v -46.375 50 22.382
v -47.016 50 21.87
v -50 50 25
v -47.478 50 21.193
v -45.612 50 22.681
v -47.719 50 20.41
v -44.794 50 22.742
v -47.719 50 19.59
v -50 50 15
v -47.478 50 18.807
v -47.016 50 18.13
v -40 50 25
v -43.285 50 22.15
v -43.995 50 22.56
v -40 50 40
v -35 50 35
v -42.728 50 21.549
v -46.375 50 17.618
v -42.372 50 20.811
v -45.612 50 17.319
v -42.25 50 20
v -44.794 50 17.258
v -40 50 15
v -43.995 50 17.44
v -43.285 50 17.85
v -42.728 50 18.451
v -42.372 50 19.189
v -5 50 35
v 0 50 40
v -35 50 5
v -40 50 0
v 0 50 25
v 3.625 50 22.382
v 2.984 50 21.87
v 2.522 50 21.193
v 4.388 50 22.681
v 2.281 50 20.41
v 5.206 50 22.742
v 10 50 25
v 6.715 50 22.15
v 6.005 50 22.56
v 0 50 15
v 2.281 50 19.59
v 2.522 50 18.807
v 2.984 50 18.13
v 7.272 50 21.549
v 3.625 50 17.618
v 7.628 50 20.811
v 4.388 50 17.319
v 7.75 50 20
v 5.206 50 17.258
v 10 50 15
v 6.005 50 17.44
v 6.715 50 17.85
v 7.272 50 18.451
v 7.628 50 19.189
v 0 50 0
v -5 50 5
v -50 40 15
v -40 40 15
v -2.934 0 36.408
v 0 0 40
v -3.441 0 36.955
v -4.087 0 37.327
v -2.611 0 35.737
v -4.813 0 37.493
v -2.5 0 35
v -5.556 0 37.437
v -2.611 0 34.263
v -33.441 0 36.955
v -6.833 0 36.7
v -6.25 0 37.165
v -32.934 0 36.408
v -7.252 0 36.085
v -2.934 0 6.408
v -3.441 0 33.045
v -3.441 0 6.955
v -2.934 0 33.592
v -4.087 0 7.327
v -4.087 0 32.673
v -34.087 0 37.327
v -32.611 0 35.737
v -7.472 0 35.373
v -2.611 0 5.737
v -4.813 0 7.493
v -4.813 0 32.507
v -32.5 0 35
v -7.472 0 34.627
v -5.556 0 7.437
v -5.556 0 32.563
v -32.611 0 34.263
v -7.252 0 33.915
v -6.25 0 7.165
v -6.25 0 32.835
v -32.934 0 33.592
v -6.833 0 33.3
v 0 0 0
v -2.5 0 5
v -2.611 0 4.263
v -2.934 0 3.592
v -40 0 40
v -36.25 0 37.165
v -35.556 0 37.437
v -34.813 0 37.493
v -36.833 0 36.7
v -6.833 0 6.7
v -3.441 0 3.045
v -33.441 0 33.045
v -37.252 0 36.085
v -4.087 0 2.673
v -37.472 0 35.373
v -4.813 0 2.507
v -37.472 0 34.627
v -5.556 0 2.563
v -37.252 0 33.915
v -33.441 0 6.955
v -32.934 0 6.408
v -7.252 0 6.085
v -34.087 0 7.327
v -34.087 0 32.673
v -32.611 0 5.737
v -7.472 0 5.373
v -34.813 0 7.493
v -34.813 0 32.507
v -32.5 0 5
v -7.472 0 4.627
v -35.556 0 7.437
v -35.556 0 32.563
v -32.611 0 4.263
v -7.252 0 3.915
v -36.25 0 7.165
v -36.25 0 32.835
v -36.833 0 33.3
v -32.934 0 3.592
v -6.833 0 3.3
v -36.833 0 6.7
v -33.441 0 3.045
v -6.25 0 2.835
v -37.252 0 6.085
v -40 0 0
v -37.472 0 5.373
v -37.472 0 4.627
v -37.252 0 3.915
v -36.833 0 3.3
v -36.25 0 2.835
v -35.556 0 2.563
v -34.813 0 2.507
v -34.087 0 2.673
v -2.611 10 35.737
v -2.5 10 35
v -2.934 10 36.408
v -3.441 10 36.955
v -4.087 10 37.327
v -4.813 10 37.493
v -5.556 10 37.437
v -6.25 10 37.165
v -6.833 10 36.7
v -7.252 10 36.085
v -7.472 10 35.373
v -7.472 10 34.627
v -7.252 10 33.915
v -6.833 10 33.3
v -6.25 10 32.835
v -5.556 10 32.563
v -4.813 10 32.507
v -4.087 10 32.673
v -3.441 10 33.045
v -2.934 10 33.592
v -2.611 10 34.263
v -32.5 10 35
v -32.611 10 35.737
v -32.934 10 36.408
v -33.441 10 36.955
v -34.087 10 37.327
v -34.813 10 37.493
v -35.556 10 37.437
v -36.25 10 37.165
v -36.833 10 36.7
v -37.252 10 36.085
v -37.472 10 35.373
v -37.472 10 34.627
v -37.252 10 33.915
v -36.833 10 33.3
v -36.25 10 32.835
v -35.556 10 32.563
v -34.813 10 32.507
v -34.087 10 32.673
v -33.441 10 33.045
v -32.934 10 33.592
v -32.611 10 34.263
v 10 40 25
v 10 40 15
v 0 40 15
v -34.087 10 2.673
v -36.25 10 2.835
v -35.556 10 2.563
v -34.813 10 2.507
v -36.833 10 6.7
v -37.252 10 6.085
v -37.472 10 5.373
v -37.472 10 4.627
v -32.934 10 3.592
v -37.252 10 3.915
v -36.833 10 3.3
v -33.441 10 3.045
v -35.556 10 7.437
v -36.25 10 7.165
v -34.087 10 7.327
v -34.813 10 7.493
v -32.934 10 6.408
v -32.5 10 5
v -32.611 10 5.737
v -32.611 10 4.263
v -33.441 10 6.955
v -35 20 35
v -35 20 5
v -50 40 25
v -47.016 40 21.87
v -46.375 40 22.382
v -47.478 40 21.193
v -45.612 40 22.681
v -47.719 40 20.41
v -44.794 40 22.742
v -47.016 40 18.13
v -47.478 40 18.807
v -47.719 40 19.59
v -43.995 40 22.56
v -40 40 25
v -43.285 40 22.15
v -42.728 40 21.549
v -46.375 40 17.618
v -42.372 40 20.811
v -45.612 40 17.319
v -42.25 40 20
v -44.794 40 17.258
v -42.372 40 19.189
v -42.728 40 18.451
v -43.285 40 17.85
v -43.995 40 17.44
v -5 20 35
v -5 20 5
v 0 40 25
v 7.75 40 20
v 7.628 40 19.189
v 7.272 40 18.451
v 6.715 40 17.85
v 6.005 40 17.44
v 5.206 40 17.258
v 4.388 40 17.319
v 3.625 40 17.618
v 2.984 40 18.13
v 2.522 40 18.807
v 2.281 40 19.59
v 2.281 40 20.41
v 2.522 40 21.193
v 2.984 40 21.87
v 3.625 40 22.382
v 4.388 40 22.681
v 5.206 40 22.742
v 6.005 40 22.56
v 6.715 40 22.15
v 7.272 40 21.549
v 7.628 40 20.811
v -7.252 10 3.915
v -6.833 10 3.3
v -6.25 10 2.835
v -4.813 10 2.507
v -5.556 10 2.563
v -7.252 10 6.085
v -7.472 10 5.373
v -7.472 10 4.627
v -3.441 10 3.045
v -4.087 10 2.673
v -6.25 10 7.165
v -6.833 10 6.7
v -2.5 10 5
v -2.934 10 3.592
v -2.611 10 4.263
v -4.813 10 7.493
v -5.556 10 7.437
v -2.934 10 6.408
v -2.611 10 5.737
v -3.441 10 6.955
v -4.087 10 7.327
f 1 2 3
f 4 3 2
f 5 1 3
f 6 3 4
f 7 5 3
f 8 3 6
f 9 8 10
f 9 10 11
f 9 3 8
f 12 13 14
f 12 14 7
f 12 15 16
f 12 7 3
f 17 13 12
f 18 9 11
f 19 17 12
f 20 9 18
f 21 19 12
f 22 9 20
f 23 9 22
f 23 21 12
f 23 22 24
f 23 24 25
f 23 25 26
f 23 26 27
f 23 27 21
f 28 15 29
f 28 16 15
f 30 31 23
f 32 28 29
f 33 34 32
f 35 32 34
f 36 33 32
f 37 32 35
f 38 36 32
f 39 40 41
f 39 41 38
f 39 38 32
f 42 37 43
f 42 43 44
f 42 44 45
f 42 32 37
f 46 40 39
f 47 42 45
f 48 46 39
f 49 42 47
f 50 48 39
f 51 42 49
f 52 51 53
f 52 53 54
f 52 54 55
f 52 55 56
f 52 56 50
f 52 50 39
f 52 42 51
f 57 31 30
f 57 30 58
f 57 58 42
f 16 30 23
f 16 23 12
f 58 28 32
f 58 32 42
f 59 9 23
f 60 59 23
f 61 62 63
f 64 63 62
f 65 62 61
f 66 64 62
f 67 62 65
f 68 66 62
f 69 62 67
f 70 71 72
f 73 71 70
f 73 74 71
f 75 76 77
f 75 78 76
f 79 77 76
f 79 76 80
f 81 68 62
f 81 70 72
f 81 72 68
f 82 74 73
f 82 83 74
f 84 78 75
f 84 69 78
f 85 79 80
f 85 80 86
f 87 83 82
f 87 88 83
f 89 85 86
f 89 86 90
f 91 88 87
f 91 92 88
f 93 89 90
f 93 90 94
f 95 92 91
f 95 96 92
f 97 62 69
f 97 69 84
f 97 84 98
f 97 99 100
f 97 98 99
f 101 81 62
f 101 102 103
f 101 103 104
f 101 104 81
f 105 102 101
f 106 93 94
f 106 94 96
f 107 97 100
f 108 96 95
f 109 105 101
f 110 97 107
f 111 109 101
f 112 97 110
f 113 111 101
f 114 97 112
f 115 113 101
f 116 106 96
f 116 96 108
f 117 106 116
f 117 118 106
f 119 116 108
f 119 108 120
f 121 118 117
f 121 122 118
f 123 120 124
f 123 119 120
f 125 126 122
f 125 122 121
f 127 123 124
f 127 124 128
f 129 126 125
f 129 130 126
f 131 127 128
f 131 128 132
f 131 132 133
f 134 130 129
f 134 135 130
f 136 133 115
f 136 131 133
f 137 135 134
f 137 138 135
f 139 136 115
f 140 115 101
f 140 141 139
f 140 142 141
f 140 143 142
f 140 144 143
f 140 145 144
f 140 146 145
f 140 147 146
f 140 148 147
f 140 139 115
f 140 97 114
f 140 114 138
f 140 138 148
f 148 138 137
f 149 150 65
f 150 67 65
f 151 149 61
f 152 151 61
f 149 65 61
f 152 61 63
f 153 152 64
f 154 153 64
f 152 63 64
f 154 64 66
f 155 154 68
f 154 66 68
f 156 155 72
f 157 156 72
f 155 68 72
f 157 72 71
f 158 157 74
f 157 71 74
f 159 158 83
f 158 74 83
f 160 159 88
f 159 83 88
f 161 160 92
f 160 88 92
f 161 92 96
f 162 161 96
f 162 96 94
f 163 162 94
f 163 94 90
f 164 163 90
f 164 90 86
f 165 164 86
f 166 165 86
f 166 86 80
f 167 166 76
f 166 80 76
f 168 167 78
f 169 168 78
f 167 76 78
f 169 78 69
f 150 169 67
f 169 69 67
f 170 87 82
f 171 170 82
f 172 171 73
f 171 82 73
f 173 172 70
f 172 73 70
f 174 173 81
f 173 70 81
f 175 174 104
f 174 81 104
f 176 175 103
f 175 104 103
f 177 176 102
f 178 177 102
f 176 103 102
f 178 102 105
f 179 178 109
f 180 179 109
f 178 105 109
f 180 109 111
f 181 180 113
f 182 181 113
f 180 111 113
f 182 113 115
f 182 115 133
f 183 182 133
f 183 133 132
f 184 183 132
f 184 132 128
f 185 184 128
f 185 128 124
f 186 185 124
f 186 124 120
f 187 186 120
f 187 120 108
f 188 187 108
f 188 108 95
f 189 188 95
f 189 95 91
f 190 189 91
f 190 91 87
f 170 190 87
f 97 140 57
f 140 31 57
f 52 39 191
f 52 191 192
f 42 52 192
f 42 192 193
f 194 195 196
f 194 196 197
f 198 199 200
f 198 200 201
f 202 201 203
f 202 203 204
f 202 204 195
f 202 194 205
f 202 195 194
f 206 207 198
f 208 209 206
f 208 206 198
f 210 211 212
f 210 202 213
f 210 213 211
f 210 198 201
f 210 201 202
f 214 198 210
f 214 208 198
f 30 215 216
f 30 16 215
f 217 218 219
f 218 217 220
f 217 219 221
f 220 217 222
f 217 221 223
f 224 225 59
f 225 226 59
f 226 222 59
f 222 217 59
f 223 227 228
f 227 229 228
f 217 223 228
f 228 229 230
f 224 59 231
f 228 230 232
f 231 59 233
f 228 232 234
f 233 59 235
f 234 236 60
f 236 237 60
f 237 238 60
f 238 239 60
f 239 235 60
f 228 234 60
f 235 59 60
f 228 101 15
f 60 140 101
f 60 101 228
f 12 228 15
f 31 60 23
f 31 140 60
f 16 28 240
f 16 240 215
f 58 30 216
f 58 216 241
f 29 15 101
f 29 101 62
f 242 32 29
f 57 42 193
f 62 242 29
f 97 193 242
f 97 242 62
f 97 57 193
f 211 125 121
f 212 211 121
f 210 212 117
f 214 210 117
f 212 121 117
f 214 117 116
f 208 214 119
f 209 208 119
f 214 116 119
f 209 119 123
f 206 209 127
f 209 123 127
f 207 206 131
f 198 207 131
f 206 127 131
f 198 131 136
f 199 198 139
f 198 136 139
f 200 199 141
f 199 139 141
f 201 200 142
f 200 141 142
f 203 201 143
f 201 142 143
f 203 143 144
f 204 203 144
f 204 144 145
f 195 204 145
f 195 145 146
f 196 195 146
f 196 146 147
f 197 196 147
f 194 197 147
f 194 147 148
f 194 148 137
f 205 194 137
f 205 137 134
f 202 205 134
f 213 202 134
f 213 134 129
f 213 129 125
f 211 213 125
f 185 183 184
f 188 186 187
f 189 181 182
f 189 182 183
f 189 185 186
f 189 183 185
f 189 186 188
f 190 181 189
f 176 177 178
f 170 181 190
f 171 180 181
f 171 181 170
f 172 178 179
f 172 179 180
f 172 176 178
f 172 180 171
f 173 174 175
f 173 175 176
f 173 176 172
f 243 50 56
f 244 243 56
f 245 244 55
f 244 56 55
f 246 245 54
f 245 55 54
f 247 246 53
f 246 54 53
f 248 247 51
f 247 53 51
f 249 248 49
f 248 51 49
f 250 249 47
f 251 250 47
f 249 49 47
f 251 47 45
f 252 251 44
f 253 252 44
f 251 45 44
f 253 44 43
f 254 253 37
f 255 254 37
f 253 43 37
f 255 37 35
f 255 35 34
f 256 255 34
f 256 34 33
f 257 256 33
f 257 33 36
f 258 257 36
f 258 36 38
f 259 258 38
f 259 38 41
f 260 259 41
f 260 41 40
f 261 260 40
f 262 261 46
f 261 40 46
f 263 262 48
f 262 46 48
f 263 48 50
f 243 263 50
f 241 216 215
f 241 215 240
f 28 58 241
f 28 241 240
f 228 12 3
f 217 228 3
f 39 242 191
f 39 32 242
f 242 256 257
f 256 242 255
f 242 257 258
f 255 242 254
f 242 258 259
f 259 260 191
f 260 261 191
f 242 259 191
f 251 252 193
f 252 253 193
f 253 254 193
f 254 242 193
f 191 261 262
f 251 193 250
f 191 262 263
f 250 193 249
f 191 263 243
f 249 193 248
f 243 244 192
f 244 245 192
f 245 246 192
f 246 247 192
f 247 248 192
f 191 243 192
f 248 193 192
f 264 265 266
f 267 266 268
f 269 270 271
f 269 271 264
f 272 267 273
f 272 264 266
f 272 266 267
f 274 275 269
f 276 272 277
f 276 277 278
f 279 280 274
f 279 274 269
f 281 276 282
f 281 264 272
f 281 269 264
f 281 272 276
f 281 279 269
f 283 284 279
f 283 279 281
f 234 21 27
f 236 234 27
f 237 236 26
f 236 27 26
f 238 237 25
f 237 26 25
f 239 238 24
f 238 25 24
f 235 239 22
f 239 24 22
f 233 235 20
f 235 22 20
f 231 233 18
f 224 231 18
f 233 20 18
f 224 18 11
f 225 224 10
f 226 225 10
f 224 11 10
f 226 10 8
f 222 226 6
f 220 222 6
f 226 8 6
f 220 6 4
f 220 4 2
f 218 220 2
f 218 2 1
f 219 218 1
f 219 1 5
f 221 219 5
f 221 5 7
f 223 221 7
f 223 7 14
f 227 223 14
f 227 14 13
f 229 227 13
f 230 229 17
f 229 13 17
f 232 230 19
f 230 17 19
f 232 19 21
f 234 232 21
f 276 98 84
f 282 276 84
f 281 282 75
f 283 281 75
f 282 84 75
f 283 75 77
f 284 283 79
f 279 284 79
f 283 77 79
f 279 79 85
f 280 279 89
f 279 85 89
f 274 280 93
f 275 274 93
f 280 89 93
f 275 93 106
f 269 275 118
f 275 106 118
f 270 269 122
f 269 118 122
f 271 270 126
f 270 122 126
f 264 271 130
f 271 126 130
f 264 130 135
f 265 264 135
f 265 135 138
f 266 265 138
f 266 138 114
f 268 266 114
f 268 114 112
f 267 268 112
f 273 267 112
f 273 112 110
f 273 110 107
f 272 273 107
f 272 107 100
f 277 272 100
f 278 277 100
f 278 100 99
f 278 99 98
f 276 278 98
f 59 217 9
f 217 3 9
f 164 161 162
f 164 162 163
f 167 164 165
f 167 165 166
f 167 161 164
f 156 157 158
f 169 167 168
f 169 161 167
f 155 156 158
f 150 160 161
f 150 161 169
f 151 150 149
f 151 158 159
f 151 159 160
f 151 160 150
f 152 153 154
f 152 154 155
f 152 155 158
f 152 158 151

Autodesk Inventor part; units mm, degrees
ref_plane "YZ Plane" through (0, 0, 0) normal (1, 0, 0) x (0, 1, 0)
ref_plane "XZ Plane" through (0, 0, 0) normal (0, 1, 0) x (-1, 0, 0)
ref_plane "XY Plane" through (0, 0, 0) normal (0, 0, 1) x (1, 0, 0)
sketch "Sketch1" plane through (0, 0, 0) normal (0, 0, 1) x (1, 0, 0)
  line L0 (0, 0) -> (-40, 0)
  line L1 (-40, 0) -> (-40, 50)
  line L2 (-40, 50) -> (0, 50)
  line L3 (0, 50) -> (0, 0)
  dimension "d0" = 50
  dimension "d1" = 40
extrude "Extrusion1" add sketch "Sketch1" along normal blind 40
sketch "Sketch2" plane through (-40, 50, 0) normal (0, 1, 0) x (1, 0, 0)
  line L0 (40, 0) -> (0, 0) projected
  line L1 (0, 0) -> (0, -40) projected
  line L2 (40, -40) -> (0, -40) projected
  line L3 (40, 0) -> (40, -40) projected
  line L4 (5, -5) -> (35, -5)
  line L5 (35, -5) -> (35, -35)
  line L6 (35, -35) -> (5, -35)
  line L7 (5, -35) -> (5, -5)
  dimension "d5" = 5
extrude "Extrusion2" cut sketch "Sketch2" against normal blind 30 contours L4 L5 L6 L7
sketch "Sketch3" plane through (-40, 0, 0) normal (0, -1, 0) x (1, 0, 0)
  circle A0 centre (5, 35) radius 2.5
  line L0 (5, 35) -> (7.3437, 35)
  line L1 (7.3437, 35) -> (7.3437, 32.7108)
  circle A1 centre (35, 35) radius 2.5
  circle A2 centre (5, 5) radius 2.5
  circle A3 centre (35, 5) radius 2.5
  line L2 (0, 40) -> (40, 40) projected
  line L3 (0, 0) -> (0, 40) projected
  point P0 (40, 0)
  dimension "d10" = 30
  dimension "d13" = 30
  dimension "d16" = 5
  dimension "d17" = 5
  dimension "d18" = 5
extrude "Extrusion3" cut sketch "Sketch3" against normal blind 10
sketch "Sketch4" plane through (-40, 50, 0) normal (0, 1, 0) x (1, 0, 0)
  line L0 (0, 0) -> (0, -40) projected
  line L1 (0, -25) -> (-10, -25)
  line L2 (-10, -25) -> (-10, -15)
  line L3 (-10, -15) -> (0, -15)
  line L4 (0, -15) -> (0, -25)
  line L5 (40, 0) -> (40, -40) projected
  line L6 (40, -25) -> (50, -25)
  line L7 (50, -25) -> (50, -15)
  line L8 (50, -15) -> (40, -15)
  line L9 (40, -15) -> (40, -25)
  line L10 (-23.587, -20) -> (57.8749, -20)
  line L11 (40, -40) -> (0, -40) projected
  line L12 (35, -5) -> (35, -35) projected
  line L13 (35, -35) -> (5, -35) projected
  line L14 (5, -35) -> (5, -5) projected
  line L15 (5, -5) -> (35, -5) projected
  line L16 (40, 0) -> (0, 0) projected
  line L17 (0, 0) -> (0, -40) projected
  line L18 (40, -40) -> (0, -40) projected
  line L19 (40, 0) -> (40, -40) projected
  circle A0 centre (-5, -20) radius 2.75
  circle A1 centre (45, -20) radius 2.75
  point P0 (0, -20)
  point P1 (0, -20)
  point P2 (-5, -15)
  point P3 (45, -15)
  dimension "d21" = 10
  dimension "d22" = 10
  dimension "d23" = 10
  dimension "d26" = 5.5
  dimension "d27" = 5.5
extrude "Extrusion4" add sketch "Sketch4" against normal blind 10 contours L0 L10 A0 L2 L3 | L0 L1 L2 L10 A0 | L8 L7 L10 A1 L5 | L10 A1 L7 L6 L5
properties part number "battery5V_box"
